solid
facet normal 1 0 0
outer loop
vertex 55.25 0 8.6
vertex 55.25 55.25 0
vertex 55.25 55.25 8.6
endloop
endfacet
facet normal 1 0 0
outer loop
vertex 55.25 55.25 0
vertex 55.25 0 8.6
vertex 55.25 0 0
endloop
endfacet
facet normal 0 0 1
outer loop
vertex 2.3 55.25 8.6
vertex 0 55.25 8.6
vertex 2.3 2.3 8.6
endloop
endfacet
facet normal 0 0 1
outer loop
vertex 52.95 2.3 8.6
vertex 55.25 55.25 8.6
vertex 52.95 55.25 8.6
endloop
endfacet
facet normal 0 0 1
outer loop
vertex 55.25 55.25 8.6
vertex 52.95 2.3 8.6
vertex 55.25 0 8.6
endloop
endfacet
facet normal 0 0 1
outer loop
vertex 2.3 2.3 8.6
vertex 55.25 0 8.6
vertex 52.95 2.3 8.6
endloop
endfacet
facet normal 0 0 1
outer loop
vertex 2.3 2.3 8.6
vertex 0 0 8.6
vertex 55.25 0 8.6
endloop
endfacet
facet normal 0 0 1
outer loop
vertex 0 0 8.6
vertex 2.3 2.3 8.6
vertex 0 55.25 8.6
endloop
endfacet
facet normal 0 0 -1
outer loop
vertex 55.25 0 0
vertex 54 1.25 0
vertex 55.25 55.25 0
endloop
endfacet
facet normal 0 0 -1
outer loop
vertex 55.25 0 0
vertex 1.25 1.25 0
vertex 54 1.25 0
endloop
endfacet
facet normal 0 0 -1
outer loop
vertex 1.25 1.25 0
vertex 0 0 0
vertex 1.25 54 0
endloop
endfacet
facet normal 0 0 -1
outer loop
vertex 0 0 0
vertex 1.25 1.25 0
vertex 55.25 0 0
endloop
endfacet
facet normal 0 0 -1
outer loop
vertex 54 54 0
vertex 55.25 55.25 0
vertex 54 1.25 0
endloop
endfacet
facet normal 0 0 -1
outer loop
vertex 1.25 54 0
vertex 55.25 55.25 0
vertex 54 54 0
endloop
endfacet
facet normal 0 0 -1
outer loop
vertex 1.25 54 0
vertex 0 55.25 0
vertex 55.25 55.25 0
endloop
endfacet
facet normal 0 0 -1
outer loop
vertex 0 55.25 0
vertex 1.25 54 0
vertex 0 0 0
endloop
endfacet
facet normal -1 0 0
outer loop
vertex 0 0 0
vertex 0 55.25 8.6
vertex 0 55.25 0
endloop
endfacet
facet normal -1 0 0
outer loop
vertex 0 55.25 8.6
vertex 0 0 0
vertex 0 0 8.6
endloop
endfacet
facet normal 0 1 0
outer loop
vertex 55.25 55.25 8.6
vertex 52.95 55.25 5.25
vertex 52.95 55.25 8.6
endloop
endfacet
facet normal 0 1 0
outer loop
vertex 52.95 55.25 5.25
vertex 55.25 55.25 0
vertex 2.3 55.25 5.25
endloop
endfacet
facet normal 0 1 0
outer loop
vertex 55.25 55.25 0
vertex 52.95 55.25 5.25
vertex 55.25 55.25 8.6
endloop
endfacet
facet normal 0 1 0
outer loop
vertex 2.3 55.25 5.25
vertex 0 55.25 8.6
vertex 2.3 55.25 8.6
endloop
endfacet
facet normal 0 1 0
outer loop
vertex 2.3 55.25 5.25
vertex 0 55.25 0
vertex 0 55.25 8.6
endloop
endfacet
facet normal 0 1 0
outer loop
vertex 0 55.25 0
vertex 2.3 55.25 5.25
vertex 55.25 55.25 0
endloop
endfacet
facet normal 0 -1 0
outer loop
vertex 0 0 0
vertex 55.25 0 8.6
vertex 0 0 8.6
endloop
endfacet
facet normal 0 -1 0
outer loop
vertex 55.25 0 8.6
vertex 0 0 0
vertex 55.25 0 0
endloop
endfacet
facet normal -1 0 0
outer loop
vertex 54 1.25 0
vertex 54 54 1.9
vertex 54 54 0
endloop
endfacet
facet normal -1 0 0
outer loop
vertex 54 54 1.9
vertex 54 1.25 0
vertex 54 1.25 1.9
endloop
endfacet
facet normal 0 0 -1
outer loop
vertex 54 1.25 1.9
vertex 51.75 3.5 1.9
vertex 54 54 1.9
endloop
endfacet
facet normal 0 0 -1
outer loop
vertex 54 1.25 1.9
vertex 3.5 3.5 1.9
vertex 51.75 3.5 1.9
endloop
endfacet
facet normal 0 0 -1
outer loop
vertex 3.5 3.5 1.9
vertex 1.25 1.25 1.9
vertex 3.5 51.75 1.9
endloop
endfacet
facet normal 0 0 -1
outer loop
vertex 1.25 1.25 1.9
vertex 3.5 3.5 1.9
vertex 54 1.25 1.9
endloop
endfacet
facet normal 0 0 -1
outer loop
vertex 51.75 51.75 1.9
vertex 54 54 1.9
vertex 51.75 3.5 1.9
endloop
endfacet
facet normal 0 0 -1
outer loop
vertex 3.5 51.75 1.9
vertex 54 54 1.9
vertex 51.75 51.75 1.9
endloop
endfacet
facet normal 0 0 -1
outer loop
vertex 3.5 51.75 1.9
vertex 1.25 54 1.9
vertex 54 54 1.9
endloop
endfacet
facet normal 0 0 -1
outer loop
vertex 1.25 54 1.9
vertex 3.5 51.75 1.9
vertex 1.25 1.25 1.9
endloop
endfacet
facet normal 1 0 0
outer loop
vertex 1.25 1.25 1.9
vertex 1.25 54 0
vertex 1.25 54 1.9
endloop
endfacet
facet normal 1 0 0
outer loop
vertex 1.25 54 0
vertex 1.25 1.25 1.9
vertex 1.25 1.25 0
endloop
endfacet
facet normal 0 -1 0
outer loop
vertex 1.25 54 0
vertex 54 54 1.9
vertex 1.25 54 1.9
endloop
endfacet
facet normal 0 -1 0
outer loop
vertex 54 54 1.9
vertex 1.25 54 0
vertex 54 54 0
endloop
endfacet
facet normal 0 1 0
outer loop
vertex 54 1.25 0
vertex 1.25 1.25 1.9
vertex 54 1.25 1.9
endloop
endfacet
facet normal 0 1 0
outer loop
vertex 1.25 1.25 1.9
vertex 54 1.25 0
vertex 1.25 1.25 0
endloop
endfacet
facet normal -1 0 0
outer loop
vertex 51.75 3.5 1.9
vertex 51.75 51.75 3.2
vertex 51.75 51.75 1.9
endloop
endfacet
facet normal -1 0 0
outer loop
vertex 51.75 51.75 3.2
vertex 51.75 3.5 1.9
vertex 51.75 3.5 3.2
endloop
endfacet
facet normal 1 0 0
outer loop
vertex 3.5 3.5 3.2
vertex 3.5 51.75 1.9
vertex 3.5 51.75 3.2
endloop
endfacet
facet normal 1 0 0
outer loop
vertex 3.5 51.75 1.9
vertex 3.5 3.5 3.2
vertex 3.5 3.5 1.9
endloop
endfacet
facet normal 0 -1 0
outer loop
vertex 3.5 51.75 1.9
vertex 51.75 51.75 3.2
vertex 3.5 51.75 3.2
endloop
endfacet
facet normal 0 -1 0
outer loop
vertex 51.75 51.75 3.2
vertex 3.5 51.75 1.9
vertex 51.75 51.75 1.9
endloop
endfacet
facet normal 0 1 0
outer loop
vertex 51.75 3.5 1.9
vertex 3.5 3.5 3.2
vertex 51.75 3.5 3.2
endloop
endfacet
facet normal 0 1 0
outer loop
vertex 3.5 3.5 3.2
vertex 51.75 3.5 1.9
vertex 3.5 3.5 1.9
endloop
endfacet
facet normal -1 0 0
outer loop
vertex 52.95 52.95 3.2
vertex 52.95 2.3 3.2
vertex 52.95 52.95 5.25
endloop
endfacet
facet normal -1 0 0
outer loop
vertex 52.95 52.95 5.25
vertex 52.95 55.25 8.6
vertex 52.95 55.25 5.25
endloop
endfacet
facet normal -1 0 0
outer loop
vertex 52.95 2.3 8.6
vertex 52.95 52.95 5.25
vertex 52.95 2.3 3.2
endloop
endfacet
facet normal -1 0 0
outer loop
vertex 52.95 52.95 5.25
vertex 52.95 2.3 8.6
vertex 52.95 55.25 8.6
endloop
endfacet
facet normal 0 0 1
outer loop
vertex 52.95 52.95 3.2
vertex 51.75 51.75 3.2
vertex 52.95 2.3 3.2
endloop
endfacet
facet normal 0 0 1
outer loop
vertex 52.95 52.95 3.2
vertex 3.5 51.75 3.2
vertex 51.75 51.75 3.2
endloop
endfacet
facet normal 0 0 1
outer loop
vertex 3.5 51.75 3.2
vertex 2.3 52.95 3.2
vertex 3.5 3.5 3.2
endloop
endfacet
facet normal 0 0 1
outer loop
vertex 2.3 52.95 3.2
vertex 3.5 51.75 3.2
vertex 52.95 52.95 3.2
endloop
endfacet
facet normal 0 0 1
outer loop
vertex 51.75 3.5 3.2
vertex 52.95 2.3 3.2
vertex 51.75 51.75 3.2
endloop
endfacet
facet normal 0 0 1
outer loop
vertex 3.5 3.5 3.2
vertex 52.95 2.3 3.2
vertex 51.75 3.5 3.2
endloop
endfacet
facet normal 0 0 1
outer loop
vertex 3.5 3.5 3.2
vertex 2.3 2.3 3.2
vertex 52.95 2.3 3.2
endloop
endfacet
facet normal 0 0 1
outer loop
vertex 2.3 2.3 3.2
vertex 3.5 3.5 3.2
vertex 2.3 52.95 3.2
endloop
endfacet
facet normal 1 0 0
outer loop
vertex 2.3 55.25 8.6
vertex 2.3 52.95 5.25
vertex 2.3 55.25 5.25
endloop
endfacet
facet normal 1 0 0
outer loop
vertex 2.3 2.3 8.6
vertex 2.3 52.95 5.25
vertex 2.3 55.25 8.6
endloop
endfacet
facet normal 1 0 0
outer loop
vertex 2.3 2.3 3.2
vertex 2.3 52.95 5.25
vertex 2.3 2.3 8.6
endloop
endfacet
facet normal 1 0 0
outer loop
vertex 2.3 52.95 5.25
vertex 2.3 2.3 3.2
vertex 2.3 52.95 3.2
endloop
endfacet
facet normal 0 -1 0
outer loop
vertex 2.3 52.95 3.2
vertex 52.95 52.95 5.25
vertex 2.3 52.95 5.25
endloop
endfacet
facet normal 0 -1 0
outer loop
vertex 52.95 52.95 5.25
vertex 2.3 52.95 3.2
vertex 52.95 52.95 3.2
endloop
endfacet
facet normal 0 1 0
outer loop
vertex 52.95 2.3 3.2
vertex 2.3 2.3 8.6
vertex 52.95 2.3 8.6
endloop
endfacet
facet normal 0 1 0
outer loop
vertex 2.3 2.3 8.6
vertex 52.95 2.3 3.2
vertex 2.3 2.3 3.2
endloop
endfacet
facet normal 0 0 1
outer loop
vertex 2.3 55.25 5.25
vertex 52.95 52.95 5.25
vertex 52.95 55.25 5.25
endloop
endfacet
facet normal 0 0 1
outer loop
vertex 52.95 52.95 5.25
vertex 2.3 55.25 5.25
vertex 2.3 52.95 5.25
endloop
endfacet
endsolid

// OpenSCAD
difference() {
    cube([55.25, 55.25, 8.6]);
    translate([1.25, 1.25, 0]) {
        cube([52.75, 52.75, 1.9]);
    }
    translate([3.5, 3.5, 0]) {
        cube([48.25, 48.25, 10]);
    }
    translate([2.3, 2.3, 3.2]) {
        cube([50.65, 50.65, 5.4]);
    }
    translate([2.3, 2.3, 5.25]) {
        cube([50.65, 55.65, 5.4]);
    }
}
